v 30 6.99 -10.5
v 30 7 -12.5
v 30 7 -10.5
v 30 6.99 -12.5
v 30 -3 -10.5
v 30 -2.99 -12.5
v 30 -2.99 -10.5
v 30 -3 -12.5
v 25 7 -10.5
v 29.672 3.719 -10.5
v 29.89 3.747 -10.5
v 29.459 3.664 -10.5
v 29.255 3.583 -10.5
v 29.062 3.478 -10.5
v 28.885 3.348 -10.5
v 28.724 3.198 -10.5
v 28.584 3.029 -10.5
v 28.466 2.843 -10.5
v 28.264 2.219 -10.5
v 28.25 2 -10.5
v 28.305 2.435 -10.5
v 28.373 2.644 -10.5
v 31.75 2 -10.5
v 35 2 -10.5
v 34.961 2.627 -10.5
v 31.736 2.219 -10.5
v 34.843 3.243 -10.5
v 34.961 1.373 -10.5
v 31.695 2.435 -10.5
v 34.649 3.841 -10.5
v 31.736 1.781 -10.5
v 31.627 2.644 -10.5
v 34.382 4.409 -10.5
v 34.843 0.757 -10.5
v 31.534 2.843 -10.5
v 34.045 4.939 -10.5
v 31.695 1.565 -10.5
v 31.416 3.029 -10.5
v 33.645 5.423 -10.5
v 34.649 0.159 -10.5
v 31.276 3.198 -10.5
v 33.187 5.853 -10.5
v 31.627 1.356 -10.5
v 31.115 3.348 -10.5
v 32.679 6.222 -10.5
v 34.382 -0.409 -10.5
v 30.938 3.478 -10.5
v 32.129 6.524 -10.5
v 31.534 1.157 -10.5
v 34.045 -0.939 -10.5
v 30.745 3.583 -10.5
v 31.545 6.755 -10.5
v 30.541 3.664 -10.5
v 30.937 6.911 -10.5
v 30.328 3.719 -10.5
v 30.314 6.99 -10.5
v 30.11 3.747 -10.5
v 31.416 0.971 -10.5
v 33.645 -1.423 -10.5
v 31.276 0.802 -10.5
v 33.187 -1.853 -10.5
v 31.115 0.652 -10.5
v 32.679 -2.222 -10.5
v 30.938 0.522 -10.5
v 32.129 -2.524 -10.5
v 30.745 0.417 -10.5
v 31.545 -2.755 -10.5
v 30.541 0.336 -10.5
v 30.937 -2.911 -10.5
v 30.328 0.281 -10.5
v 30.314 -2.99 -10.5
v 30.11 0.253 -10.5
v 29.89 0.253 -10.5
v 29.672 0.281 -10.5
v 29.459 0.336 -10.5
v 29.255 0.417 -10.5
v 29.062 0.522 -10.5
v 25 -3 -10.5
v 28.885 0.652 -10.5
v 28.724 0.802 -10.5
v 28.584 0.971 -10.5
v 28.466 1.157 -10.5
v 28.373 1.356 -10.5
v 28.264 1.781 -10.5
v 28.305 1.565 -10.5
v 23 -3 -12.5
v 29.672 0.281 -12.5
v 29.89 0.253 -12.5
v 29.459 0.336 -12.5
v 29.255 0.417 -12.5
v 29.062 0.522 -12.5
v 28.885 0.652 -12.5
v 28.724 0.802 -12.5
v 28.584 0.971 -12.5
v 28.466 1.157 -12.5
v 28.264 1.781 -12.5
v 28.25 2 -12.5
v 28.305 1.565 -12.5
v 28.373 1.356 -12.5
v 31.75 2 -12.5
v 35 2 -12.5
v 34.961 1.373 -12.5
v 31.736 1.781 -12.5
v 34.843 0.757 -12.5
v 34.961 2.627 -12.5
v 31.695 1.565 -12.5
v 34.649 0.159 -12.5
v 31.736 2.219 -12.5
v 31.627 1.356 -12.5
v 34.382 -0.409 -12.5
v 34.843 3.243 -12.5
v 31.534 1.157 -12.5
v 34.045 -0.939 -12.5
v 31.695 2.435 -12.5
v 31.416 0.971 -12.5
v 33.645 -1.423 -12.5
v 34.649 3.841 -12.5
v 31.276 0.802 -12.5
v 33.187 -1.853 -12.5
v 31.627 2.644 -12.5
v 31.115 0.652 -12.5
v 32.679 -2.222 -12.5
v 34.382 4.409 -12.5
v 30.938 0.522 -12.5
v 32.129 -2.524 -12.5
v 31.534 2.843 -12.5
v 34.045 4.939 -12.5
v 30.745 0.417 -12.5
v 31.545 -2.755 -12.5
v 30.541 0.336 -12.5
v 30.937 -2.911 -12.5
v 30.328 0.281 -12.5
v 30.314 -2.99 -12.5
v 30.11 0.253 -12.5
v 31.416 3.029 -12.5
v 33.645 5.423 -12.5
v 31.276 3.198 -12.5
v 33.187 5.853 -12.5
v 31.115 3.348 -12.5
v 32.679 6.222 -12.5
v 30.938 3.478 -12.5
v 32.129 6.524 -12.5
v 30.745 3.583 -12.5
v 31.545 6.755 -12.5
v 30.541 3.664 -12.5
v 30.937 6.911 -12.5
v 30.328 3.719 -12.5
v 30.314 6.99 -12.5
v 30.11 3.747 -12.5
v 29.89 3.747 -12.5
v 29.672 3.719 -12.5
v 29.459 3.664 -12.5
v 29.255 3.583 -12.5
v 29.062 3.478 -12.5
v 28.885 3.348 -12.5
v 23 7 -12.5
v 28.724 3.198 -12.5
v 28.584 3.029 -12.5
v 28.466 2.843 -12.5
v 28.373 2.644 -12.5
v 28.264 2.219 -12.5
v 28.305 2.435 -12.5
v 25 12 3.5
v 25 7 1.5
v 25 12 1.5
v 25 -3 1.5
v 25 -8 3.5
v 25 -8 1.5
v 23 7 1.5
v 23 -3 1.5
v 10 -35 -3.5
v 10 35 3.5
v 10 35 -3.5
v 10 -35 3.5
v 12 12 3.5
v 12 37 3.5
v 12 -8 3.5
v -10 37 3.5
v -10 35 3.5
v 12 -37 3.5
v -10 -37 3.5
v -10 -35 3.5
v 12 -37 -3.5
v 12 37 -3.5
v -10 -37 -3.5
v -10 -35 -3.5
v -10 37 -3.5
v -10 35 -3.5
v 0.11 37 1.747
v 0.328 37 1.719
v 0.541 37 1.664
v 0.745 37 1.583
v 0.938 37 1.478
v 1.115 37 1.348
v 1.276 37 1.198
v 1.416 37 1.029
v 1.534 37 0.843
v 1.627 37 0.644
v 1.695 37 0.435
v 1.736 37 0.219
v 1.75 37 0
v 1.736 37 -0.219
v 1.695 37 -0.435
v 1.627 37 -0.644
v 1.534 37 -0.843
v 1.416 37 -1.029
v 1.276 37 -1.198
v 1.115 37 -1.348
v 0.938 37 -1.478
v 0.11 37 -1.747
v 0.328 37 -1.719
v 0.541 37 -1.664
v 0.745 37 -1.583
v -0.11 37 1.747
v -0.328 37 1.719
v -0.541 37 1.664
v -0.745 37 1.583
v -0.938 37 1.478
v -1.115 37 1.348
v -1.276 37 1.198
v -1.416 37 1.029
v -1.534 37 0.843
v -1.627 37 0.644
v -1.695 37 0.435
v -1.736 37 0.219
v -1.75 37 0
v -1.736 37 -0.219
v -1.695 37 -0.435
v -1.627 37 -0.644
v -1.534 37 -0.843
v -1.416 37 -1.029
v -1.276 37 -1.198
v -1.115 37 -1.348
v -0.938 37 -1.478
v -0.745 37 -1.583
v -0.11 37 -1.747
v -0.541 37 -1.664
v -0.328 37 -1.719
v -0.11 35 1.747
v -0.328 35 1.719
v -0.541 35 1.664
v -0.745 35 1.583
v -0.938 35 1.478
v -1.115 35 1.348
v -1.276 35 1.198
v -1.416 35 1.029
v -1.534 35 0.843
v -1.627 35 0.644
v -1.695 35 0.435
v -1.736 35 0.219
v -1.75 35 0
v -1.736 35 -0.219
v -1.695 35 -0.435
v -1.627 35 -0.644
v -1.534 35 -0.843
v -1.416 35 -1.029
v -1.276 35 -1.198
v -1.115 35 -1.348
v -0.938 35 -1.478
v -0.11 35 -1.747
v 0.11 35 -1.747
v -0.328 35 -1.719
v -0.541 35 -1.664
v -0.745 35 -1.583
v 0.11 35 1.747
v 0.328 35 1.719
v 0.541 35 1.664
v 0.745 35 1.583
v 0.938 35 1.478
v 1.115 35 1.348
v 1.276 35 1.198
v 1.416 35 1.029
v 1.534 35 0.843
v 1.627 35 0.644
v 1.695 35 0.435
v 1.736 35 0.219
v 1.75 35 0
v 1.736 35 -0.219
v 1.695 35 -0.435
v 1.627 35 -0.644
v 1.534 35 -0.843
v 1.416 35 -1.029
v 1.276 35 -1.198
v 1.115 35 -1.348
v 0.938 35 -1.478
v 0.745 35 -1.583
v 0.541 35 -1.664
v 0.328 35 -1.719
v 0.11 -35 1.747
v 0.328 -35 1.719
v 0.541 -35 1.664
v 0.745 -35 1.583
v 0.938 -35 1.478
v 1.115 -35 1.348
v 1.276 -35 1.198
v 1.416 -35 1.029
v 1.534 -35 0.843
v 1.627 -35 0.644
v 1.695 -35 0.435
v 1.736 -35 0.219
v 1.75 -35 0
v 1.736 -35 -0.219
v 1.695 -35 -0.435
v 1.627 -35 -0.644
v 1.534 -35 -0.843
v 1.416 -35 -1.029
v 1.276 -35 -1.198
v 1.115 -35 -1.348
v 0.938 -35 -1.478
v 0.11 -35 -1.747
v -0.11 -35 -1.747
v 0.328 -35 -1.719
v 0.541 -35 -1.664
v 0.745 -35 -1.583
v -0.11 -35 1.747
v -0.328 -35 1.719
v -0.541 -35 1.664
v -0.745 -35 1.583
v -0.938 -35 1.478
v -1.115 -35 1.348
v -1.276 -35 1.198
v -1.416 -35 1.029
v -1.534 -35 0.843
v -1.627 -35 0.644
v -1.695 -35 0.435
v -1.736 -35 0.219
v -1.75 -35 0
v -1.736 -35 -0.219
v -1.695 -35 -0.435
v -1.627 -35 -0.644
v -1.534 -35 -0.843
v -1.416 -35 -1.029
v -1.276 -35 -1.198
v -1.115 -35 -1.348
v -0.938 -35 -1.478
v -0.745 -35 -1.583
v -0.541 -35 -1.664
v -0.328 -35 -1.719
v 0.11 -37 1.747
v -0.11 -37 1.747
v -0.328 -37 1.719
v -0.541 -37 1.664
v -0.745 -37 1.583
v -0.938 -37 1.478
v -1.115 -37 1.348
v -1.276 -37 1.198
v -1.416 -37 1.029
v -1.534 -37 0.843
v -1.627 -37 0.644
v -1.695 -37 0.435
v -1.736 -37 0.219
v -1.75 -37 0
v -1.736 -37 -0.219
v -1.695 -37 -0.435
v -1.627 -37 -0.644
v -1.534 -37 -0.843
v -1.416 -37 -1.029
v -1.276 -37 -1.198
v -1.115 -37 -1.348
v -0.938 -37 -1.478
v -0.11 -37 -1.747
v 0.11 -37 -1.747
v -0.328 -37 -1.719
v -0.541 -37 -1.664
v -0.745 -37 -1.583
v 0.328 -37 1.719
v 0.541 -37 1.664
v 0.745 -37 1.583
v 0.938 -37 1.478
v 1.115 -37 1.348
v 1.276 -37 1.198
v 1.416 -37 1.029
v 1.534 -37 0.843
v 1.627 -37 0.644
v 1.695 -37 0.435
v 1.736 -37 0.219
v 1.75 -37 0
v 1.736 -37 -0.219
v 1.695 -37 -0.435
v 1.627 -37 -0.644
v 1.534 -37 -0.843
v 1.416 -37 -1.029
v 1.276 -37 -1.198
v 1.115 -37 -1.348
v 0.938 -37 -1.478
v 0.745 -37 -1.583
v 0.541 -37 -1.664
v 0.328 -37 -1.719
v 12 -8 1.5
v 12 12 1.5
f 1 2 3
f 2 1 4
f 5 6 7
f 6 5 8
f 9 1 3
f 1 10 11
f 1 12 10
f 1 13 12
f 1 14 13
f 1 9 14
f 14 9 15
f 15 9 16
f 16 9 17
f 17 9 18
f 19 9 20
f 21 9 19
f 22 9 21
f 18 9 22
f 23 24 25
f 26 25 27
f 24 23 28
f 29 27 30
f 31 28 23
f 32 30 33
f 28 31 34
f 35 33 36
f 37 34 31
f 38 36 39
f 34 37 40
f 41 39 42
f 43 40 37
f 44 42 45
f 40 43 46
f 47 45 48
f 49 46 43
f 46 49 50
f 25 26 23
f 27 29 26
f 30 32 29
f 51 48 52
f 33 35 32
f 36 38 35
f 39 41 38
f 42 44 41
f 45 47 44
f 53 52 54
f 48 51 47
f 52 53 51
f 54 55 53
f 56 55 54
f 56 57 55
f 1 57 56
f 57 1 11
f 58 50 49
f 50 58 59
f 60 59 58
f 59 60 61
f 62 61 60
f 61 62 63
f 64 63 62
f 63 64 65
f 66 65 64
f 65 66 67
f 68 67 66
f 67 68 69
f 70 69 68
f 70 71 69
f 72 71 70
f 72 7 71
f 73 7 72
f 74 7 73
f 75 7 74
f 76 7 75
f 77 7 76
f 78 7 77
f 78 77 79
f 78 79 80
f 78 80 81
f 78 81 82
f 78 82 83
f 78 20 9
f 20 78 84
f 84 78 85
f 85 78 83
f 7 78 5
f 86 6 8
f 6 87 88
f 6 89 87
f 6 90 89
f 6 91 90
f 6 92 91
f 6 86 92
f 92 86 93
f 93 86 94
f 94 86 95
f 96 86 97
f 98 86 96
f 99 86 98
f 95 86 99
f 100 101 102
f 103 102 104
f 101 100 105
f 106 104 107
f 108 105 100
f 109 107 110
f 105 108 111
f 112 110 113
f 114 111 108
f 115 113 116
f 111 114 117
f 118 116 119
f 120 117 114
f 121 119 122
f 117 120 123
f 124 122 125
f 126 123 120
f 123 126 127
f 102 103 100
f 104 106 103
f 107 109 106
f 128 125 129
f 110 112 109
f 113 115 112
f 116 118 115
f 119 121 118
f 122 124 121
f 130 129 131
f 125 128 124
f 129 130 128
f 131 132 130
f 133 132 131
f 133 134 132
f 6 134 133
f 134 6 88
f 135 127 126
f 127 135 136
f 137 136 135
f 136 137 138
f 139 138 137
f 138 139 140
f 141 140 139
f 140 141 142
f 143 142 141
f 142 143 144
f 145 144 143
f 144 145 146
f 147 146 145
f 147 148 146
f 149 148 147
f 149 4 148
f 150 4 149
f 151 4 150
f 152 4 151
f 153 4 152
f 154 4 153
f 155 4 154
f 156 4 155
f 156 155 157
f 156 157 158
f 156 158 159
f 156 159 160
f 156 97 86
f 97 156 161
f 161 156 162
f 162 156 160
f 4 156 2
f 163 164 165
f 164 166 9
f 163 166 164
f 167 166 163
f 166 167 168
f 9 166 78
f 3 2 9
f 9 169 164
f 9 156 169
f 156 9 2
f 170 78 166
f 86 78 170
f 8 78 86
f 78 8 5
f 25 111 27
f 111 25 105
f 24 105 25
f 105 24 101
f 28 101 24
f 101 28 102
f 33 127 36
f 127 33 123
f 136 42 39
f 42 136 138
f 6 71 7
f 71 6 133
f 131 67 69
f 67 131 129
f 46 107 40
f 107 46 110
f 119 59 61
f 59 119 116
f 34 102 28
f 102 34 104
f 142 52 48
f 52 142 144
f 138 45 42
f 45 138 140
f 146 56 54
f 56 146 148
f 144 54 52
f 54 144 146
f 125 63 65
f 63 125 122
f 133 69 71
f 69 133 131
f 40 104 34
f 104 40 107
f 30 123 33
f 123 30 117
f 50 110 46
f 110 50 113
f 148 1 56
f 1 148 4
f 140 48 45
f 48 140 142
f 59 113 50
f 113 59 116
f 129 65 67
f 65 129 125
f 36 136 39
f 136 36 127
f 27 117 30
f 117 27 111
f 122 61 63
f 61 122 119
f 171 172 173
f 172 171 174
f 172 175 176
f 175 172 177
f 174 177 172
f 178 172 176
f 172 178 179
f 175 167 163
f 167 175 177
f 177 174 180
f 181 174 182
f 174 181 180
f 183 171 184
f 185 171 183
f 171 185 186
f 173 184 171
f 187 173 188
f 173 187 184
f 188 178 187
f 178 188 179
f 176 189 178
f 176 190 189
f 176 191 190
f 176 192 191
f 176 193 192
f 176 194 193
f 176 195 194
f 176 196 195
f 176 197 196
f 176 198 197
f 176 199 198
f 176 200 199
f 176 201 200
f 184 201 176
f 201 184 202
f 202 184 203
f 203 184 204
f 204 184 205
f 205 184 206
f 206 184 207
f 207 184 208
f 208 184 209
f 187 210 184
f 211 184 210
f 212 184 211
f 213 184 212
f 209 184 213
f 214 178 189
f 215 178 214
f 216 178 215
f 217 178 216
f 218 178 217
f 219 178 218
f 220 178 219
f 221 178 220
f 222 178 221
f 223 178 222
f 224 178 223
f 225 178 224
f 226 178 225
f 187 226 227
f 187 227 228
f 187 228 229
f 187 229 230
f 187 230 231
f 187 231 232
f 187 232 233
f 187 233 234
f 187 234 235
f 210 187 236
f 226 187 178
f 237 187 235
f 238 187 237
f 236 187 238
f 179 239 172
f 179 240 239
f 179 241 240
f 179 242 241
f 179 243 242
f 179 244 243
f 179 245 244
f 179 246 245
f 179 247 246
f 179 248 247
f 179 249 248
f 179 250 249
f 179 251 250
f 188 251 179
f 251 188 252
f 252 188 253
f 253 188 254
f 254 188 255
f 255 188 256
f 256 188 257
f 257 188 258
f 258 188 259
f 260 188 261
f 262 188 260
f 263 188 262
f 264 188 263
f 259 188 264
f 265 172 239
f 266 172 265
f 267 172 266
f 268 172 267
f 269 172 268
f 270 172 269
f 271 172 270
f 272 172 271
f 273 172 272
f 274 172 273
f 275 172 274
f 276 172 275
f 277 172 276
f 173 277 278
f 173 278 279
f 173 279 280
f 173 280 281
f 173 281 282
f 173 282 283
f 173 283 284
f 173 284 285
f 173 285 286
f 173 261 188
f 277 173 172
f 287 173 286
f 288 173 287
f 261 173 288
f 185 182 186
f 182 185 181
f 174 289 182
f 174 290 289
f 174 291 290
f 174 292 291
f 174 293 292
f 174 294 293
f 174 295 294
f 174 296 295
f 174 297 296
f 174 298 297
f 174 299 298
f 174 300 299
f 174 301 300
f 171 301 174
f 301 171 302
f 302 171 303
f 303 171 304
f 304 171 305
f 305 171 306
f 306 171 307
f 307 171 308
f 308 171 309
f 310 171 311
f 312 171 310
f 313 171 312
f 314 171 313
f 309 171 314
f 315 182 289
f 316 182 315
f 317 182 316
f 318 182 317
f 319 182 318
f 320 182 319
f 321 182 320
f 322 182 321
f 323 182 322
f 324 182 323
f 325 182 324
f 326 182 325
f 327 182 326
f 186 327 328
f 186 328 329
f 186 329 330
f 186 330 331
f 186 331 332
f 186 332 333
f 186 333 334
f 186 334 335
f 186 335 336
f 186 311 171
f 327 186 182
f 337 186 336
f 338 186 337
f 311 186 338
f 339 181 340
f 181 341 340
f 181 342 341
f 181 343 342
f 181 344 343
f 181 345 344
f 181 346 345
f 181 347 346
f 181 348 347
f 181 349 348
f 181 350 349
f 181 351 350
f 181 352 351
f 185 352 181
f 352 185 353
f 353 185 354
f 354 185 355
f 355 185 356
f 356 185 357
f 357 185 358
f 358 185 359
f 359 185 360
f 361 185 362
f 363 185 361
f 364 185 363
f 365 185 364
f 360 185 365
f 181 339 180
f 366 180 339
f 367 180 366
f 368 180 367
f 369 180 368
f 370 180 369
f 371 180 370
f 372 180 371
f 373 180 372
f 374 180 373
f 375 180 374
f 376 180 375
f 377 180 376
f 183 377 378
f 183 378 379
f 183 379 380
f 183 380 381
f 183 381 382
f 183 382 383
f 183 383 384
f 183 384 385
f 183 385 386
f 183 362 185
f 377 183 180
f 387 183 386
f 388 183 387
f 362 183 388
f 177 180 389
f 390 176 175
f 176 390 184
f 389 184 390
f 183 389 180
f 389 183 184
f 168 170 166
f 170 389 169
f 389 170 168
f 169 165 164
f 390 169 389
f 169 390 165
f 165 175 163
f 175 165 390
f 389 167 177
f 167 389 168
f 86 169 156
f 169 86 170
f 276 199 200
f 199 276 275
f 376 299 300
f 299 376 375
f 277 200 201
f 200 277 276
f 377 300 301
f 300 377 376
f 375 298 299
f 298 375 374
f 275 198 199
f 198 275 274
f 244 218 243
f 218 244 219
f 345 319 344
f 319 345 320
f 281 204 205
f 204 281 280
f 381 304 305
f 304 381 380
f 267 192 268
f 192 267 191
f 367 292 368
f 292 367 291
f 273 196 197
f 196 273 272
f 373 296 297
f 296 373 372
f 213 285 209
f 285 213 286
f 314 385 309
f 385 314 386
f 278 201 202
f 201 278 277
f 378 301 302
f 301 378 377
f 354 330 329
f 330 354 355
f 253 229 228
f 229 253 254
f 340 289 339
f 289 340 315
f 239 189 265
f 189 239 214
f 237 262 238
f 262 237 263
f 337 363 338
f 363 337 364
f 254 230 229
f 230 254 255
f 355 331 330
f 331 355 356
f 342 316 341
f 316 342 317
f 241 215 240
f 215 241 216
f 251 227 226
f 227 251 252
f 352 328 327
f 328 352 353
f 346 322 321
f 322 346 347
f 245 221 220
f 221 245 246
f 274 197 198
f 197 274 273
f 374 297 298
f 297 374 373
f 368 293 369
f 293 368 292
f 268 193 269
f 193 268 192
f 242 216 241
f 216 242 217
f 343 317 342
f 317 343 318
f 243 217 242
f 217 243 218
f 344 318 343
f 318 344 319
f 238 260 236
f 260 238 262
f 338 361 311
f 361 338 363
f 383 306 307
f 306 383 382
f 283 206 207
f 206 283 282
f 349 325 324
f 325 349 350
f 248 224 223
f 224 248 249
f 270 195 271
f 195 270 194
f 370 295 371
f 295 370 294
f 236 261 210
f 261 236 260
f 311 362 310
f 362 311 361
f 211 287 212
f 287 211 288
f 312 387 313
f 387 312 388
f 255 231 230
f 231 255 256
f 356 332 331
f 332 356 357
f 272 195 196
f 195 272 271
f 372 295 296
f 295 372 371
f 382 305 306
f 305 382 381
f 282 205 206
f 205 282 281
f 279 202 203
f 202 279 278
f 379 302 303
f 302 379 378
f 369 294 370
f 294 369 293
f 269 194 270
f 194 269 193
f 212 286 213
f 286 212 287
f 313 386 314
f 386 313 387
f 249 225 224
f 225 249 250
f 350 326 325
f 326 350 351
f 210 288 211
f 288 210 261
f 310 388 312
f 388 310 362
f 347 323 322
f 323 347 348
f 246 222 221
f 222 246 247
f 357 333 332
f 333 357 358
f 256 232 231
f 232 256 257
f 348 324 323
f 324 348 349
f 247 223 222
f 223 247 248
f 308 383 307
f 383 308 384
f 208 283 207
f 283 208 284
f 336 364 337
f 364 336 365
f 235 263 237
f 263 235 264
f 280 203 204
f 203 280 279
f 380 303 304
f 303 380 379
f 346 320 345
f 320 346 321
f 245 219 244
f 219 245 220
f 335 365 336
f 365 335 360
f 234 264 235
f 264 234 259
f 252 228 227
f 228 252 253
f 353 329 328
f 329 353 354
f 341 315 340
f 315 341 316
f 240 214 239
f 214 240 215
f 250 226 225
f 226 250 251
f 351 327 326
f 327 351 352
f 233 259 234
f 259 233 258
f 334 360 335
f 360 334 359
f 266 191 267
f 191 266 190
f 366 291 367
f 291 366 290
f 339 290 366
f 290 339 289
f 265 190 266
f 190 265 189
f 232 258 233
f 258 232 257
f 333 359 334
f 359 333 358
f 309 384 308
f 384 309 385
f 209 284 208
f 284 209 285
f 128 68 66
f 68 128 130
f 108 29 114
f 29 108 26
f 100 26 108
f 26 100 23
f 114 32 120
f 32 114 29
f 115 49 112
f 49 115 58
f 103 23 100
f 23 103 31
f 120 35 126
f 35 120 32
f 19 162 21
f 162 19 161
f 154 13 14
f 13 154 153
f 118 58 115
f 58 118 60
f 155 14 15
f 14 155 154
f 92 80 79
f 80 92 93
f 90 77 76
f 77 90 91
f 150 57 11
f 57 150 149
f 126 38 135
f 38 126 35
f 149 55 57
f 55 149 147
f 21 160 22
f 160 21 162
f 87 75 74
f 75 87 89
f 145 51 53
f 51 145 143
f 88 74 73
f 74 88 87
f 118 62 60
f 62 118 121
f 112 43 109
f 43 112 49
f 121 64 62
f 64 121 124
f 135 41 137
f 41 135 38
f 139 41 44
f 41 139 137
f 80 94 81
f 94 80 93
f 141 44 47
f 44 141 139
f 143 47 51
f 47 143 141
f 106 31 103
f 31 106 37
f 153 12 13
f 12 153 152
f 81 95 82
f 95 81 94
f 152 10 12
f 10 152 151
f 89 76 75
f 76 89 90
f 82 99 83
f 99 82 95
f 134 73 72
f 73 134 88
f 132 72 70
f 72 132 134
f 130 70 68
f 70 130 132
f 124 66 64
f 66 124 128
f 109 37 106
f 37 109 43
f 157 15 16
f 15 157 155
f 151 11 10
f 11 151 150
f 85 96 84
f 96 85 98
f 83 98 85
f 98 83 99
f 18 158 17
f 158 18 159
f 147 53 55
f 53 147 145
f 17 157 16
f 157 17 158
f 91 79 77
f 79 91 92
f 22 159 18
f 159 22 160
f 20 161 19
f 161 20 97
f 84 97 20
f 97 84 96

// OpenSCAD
$hdd_width=70;
$hdd_height=7;
$hdd_arm_length=20;
$hdd_arm_height=$hdd_height;
$hdd_arm_thickness=2;

$hdd_screw_hole_diameter=3.5;
$hdd_screw_hole_offset=10;

$board_mounting_offset=20;
$board_mounting_diameter=3.5;
$bed_mounting_diameter=10;

$board_mounting_arm_length=$board_mounting_offset-$bed_mounting_diameter/2-$hdd_arm_thickness;
$board_mounting_arm_width=20;
$board_mounting_arm_thickness=$hdd_arm_thickness;

$hdd_z_offset=9;
$hdd_y_offset=2;

$bed_mounting_thickness=$board_mounting_arm_thickness;


$fn=50;

difference(){
union(){
//HDD
translate([0,$hdd_width/2+$hdd_arm_thickness/2,0])cube([$hdd_arm_length,$hdd_arm_thickness,$hdd_arm_height], center=true);
translate([0,-$hdd_width/2-$hdd_arm_thickness/2,0])cube([$hdd_arm_length,$hdd_arm_thickness,$hdd_arm_height], center=true);
translate([$hdd_arm_length/2+$hdd_arm_thickness/2,0,0])cube([$hdd_arm_thickness,2*$hdd_arm_thickness+$hdd_width,$hdd_arm_height], center=true);
//board arm  
    translate([$hdd_arm_length/2+$board_mounting_arm_length/2+$hdd_arm_thickness,$hdd_y_offset,$hdd_arm_height/2-$board_mounting_arm_thickness/2]) cube([$board_mounting_arm_length,$board_mounting_arm_width,$board_mounting_arm_thickness],center=true);
//arm-boar-joint
    translate([$hdd_arm_length/2+$board_mounting_arm_length+$hdd_arm_thickness/2,$hdd_y_offset,-$hdd_z_offset/2]) cube([$hdd_arm_thickness,$bed_mounting_diameter,$hdd_z_offset+$hdd_arm_height],center=true);
//board_mounting    
    translate([$hdd_arm_length/2+$board_mounting_offset,$hdd_y_offset,-$hdd_z_offset-$hdd_arm_height/2+$bed_mounting_thickness/2]){
    
        translate([-$bed_mounting_diameter/4,0,0]) cube([$bed_mounting_diameter/2,$bed_mounting_diameter,$bed_mounting_thickness], center=true);
        cylinder(d=$bed_mounting_diameter, h=$bed_mounting_thickness, center=true);
    };
    
};
//hdd_mounting_hole
translate([$hdd_arm_length/2-$hdd_screw_hole_offset,0,0])rotate([90,0,0]) cylinder(d=$hdd_screw_hole_diameter,h=2*$hdd_arm_thickness+$hdd_width, center=true);
//board_mounting_hole
translate([$hdd_arm_length/2+$board_mounting_offset,$hdd_y_offset,0]) cylinder(d=$board_mounting_diameter,h=$hdd_width, center=true);

};
